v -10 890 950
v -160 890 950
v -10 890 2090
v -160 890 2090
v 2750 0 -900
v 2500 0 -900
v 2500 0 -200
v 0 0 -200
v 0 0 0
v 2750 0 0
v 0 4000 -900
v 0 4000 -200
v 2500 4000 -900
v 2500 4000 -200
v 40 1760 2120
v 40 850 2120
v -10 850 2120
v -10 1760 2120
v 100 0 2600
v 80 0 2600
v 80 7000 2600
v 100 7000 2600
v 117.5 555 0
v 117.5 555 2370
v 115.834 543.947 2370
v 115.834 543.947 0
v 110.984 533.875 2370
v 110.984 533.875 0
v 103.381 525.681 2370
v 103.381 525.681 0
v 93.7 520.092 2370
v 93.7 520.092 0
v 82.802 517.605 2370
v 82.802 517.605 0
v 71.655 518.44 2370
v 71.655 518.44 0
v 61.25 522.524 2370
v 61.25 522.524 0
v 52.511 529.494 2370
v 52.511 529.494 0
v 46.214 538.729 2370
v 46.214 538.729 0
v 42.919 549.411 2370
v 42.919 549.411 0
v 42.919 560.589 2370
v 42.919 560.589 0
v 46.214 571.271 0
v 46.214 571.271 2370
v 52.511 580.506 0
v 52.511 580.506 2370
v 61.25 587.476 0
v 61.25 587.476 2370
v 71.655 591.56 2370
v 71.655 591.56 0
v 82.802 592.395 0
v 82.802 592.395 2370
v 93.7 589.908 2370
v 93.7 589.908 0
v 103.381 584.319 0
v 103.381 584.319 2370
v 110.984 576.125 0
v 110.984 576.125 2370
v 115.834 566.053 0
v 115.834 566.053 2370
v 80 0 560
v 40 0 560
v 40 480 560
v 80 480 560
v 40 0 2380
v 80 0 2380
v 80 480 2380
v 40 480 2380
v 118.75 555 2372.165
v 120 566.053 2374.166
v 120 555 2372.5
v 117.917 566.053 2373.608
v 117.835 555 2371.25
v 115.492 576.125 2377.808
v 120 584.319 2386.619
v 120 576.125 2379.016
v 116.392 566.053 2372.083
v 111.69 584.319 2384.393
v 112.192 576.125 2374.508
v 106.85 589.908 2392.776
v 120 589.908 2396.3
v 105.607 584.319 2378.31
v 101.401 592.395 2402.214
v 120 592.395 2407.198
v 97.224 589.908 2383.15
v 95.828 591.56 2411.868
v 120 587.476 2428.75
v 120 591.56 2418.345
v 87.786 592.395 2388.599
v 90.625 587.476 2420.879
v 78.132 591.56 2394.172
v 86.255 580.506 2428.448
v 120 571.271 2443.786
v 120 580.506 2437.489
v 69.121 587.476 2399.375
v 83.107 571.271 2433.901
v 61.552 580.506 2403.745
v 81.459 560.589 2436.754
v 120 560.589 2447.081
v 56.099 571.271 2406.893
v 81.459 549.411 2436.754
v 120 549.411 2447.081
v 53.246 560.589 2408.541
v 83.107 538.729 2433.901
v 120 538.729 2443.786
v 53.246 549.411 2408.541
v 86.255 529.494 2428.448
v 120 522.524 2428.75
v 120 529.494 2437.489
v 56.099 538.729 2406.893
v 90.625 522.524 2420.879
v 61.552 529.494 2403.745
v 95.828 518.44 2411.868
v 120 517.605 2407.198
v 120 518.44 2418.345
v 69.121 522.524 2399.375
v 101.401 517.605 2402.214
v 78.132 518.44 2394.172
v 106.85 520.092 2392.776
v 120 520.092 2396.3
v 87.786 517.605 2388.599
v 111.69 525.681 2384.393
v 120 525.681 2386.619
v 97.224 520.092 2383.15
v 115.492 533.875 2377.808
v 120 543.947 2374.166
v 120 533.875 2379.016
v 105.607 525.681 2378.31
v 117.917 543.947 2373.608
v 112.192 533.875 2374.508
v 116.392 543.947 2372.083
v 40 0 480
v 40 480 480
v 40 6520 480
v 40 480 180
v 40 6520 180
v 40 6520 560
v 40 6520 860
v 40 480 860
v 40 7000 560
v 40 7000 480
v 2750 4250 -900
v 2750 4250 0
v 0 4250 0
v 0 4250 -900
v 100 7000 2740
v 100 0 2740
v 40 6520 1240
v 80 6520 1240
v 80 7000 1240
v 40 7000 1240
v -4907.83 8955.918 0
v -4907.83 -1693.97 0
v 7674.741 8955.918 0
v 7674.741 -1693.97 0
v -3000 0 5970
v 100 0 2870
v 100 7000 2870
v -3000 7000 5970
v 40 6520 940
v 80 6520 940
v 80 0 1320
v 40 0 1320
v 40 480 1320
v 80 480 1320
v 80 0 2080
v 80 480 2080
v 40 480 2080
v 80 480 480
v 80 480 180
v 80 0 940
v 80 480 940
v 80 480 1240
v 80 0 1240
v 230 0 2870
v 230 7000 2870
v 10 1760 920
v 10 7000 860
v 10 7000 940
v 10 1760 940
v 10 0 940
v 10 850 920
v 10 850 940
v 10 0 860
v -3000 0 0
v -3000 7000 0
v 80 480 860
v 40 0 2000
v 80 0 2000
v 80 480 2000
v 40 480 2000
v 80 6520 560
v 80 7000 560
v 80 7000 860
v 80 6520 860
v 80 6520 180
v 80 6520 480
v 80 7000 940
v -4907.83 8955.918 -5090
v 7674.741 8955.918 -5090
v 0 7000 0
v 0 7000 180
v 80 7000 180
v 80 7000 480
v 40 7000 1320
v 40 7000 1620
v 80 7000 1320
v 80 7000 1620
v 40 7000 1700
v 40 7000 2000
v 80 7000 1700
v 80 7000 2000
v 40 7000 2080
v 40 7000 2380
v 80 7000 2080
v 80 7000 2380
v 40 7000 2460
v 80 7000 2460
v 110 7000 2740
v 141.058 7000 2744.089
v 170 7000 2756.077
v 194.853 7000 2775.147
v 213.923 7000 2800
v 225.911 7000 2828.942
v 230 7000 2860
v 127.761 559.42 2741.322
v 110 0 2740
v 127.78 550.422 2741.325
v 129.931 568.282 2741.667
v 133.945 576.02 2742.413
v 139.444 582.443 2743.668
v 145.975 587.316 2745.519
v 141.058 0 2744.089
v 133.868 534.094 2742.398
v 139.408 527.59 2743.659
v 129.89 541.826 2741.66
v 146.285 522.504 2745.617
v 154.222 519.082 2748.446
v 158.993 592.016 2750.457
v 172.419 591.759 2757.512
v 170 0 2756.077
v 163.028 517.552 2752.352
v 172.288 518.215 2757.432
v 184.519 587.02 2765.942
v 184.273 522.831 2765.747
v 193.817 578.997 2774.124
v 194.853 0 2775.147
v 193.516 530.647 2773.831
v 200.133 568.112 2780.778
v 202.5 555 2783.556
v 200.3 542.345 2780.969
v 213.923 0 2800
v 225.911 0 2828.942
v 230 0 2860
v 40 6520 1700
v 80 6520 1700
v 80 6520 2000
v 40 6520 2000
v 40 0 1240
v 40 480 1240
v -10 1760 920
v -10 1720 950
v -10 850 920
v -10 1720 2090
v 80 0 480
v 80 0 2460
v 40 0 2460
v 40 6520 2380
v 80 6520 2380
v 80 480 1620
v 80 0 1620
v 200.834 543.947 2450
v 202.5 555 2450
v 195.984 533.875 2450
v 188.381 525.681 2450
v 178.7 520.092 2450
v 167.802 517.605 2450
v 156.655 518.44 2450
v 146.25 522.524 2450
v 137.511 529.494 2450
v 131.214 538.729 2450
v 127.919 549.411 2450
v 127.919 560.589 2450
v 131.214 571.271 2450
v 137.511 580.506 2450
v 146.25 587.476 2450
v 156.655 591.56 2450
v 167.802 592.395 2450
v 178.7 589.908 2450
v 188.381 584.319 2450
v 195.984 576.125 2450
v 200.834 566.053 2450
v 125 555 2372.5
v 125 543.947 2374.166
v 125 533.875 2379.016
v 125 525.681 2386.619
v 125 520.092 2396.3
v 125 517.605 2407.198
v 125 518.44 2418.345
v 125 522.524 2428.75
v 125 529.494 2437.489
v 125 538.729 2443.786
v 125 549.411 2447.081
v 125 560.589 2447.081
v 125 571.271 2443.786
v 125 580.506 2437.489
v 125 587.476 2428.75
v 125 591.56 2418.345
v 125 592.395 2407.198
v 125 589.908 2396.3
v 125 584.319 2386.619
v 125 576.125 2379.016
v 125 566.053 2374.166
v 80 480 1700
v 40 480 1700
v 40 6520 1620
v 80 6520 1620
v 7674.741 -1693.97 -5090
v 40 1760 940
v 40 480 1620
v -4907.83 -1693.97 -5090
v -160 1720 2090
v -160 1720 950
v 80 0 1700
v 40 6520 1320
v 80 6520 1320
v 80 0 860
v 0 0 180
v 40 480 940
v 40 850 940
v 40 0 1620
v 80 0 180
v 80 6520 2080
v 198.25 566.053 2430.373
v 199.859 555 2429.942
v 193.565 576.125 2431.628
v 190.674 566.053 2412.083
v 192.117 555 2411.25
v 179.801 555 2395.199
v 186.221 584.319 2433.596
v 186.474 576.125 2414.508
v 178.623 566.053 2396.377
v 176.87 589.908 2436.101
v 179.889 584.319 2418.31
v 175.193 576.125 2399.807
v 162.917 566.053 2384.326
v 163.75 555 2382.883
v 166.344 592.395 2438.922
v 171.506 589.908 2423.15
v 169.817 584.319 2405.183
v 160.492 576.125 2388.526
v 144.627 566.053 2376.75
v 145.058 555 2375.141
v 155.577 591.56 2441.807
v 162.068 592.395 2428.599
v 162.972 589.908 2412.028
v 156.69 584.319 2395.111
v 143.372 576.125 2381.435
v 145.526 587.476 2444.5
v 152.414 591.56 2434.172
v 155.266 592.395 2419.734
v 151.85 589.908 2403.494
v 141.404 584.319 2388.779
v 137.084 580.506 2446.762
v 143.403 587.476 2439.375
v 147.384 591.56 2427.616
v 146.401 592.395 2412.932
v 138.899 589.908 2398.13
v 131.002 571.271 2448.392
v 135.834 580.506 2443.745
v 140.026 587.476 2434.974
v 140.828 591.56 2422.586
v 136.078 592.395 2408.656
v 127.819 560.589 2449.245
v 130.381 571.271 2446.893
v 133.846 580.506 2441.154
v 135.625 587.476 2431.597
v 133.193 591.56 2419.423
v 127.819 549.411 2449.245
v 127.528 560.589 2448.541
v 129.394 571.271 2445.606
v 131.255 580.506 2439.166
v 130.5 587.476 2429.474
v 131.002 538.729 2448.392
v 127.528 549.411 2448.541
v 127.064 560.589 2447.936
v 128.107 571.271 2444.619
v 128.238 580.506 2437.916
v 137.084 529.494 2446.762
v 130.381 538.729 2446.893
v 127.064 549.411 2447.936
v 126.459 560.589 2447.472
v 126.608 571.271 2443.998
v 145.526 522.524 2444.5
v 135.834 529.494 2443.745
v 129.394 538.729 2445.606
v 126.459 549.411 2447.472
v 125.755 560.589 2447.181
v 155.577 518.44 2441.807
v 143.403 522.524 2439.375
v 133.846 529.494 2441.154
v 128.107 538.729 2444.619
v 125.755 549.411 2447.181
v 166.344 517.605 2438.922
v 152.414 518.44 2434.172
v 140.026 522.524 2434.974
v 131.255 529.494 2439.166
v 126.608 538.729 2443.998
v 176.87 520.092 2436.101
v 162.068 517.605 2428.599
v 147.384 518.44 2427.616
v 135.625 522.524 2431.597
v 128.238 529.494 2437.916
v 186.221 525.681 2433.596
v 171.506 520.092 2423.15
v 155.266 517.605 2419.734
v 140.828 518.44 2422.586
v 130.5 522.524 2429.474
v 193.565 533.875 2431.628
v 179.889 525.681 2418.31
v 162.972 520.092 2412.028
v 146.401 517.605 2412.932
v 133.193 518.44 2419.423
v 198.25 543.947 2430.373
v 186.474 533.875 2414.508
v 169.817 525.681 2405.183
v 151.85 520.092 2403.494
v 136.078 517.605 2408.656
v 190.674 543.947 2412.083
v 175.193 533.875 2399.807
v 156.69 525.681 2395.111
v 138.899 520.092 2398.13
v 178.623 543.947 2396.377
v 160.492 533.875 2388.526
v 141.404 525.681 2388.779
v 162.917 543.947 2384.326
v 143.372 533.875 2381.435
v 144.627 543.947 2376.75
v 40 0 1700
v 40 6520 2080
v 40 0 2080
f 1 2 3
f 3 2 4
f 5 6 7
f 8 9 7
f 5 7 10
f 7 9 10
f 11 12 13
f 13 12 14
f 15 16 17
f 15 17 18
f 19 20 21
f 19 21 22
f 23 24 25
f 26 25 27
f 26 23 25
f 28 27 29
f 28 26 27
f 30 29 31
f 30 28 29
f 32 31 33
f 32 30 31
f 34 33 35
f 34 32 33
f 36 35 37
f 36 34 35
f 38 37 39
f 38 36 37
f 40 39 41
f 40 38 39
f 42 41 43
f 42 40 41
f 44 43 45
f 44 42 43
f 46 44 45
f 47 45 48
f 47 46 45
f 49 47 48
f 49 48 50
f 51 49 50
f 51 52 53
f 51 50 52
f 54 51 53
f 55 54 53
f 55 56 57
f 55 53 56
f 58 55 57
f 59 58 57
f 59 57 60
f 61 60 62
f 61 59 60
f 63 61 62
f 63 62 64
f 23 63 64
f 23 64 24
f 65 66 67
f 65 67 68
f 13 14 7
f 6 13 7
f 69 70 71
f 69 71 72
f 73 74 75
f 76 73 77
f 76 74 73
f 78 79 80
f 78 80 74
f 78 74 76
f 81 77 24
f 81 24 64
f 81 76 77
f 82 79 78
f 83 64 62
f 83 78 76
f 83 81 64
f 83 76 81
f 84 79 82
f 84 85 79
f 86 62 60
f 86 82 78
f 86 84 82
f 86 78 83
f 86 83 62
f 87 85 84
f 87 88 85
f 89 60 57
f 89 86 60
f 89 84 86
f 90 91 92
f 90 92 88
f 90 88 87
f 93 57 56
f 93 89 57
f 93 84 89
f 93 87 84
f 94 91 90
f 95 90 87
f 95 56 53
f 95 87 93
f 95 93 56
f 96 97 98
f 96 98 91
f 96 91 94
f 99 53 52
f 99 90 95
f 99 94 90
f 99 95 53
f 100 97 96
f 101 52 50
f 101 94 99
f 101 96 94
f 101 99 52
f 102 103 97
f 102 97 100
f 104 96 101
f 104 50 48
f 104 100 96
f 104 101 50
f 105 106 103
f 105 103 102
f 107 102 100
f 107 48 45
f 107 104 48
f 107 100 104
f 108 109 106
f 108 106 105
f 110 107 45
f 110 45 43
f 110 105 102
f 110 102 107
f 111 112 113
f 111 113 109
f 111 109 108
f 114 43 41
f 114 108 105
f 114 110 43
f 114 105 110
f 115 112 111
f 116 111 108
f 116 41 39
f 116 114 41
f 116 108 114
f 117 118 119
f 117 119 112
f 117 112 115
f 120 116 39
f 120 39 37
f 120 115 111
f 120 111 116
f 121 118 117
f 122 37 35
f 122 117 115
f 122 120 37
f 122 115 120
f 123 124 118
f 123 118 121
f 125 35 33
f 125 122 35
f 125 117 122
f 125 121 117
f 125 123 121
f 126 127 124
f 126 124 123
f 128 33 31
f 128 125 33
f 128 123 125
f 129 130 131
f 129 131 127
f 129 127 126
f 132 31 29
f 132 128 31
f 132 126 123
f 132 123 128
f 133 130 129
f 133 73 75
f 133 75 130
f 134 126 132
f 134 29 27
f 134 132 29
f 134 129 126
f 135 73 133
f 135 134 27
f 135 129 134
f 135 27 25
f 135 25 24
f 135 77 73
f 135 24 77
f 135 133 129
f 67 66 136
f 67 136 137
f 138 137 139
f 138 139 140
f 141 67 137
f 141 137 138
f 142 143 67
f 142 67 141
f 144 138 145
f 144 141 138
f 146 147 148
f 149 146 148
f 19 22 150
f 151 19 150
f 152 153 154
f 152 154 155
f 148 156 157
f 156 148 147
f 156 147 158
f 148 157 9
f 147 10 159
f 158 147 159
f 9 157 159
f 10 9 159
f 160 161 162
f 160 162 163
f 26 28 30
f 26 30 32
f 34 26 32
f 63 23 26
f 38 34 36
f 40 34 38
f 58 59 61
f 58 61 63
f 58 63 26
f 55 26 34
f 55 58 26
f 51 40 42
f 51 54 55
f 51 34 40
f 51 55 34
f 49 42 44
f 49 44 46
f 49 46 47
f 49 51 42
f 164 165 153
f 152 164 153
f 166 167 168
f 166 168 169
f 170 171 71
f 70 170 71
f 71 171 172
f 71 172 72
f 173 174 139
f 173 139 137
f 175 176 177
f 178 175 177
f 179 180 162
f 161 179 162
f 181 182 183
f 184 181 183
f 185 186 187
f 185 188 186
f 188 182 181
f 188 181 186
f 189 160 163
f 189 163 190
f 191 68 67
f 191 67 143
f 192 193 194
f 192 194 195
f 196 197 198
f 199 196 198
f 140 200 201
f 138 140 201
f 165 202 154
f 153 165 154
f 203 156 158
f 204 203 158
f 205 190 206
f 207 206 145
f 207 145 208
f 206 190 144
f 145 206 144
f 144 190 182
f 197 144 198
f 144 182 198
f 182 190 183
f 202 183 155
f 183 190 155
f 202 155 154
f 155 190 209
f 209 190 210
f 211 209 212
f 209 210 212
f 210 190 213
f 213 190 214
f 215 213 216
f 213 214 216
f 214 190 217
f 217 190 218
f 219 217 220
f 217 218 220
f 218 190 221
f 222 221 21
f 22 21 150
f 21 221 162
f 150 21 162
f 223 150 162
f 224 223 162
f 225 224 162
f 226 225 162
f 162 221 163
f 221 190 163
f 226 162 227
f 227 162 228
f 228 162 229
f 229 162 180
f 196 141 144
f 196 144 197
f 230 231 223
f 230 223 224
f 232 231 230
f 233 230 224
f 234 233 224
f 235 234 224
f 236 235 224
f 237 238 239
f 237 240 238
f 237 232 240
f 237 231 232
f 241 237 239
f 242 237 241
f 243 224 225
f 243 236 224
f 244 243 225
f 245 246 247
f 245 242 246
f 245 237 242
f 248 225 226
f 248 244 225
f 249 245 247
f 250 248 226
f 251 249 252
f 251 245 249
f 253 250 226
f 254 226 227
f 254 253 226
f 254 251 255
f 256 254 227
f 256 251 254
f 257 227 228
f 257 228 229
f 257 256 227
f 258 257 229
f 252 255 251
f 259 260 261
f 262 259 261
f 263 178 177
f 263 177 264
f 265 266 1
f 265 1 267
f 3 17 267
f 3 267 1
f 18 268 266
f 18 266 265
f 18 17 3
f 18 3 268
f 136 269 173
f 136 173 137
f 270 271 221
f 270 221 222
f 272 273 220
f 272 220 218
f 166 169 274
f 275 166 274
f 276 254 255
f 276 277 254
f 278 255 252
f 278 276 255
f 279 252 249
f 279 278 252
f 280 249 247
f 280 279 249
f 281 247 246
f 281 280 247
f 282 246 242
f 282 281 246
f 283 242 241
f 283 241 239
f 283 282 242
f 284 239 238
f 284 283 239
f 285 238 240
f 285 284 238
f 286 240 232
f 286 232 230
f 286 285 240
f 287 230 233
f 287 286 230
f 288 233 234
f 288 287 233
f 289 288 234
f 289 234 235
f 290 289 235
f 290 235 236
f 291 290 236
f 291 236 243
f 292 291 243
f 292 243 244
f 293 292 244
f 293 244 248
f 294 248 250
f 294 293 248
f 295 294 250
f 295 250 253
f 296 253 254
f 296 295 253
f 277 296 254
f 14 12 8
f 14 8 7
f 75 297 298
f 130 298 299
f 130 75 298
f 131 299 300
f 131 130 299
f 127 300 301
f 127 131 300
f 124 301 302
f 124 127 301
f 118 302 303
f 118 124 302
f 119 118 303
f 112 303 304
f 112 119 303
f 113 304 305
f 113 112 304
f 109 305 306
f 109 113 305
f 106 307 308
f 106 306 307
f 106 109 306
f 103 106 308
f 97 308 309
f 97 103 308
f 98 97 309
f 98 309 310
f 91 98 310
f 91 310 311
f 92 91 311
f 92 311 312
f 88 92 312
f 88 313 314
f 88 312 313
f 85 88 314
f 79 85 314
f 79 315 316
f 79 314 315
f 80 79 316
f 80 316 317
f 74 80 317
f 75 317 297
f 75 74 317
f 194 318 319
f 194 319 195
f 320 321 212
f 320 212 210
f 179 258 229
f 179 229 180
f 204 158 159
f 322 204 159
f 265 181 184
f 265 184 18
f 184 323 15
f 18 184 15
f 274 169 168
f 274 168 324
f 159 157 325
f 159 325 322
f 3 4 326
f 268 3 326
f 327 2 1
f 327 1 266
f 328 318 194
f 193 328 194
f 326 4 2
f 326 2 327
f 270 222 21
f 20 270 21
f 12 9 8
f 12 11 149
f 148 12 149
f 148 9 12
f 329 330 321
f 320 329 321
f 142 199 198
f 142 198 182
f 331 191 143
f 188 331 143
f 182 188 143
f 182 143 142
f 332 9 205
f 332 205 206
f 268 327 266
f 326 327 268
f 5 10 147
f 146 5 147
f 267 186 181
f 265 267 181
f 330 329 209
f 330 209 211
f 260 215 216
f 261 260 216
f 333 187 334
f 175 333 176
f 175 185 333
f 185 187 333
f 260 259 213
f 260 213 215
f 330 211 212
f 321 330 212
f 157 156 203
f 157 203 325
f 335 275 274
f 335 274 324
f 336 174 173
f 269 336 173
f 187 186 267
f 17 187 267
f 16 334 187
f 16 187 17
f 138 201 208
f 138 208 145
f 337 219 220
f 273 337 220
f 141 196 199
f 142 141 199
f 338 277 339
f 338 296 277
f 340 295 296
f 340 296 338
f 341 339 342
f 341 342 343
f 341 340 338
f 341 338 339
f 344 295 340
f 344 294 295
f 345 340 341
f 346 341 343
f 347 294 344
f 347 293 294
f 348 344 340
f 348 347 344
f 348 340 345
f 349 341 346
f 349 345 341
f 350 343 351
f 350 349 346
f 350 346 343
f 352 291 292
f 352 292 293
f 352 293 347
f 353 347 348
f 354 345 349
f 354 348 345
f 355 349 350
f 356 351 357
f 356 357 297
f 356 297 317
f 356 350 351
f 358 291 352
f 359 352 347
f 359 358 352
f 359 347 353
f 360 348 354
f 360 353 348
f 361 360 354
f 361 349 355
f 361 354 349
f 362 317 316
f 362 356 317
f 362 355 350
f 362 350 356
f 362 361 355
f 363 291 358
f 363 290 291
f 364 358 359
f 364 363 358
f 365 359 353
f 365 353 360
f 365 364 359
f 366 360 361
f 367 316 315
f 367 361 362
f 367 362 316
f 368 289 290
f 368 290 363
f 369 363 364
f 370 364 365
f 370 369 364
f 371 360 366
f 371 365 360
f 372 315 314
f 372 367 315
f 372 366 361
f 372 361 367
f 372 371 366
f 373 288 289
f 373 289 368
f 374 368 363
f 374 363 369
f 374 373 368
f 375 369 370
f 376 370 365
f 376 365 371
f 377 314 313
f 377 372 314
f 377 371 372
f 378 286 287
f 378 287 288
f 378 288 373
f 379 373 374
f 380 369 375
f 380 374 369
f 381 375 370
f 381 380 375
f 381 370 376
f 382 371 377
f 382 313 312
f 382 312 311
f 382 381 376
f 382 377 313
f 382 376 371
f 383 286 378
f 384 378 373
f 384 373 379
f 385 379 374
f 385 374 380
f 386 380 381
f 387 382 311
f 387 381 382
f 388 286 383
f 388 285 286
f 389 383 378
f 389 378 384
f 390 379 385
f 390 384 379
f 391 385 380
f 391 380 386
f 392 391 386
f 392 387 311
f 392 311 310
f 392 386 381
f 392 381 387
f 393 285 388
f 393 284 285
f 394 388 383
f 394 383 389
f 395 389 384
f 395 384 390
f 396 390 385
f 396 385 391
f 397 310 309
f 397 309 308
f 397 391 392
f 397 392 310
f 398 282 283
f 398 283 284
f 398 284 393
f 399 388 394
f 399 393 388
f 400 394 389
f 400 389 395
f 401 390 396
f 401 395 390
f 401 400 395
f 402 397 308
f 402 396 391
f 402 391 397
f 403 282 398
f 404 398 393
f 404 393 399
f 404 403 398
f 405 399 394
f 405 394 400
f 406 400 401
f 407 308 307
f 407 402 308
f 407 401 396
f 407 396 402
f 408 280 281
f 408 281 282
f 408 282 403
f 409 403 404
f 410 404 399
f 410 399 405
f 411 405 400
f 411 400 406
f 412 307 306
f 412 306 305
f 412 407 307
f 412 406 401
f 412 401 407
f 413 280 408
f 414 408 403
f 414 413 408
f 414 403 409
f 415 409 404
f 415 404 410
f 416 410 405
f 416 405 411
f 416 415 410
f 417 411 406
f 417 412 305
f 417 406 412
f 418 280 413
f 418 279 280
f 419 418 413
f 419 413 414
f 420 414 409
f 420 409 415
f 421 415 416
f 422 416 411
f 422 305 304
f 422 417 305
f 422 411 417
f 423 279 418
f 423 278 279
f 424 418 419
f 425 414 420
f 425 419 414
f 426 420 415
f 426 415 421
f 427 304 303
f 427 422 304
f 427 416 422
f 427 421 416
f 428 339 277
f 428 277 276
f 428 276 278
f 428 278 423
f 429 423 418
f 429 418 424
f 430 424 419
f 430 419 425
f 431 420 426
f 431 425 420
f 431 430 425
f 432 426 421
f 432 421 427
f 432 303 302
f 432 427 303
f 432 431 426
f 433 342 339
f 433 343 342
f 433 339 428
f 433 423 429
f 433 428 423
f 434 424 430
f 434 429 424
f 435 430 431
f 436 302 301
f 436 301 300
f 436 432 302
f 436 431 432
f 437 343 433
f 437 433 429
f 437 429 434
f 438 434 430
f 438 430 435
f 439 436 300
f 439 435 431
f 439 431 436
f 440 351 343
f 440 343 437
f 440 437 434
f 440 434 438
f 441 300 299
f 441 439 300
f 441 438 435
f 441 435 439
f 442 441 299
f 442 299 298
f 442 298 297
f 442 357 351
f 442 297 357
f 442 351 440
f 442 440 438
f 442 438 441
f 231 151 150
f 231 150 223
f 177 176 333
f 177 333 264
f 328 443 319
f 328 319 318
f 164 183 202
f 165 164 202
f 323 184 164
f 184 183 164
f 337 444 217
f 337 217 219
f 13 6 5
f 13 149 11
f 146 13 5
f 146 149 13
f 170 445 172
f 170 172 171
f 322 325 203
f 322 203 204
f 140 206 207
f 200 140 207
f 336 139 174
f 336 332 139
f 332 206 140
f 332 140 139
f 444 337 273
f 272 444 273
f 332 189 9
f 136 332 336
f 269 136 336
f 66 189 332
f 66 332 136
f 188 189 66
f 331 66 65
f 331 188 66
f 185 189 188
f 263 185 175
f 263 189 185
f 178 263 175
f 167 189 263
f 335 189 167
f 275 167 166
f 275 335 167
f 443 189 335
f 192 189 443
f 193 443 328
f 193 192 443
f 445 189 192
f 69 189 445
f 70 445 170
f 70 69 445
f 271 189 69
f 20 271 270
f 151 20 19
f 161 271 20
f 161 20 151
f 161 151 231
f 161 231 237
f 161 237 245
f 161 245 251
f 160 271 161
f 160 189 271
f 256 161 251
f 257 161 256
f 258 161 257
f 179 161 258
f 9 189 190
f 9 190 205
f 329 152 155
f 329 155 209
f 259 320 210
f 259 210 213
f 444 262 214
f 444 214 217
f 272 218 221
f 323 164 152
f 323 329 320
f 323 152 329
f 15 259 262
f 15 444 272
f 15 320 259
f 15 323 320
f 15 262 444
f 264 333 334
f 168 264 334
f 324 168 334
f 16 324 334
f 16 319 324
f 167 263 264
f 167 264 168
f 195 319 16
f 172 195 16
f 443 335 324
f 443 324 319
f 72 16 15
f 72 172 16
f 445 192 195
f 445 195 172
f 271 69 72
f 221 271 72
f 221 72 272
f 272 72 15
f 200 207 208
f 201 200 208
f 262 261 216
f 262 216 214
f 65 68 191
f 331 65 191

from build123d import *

# Parameters (mm, degrees)
F1_DEPTH  = 7000
F2_W      = 6040
F2_H      = 2460
F3_DEPTH  = 40
F6_R      = 37.5
F8_W      = 910
F8_H      = 1200
F9_DEPTH  = 200
F10_W     = 910
F10_H     = 1200
F10_W_2   = 830
F10_H_2   = 1140
F11_DEPTH = 150
F12_W     = 12582.5710296631
F12_H     = 10649.8882770538
F12_W_2   = 3000
F12_H_2   = 7000
F13_DEPTH = 5090
F14_W     = 2500
F14_H     = 4000
F15_DEPTH = 200
F14_H_2   = 250
F16_DEPTH = 900


# Not quite as in the source:
# - a feature names something its author has since deleted; it is built from what else it names


with BuildPart() as f1:
    # F0 (on Front) → F1 (new body)
    with BuildSketch(Plane.XZ):
        with BuildLine():
            Line((0, 180), (80, 180))
            Line((80, 180), (80, 480))
            Line((80, 480), (40, 480))
            Line((40, 480), (40, 560))
            Line((40, 560), (80, 560))
            Line((80, 560), (80, 860))
            Line((80, 860), (10, 860))
            Line((10, 860), (10, 940))
            Line((10, 940), (80, 940))
            Line((80, 940), (80, 1240))
            Line((80, 1240), (40, 1240))
            Line((40, 1240), (40, 1320))
            Line((40, 1320), (80, 1320))
            Line((80, 1320), (80, 1620))
            Line((80, 1620), (40, 1620))
            Line((40, 1620), (40, 1700))
            Line((40, 1700), (80, 1700))
            Line((80, 1700), (80, 2000))
            Line((80, 2000), (40, 2000))
            Line((40, 2000), (40, 2080))
            Line((40, 2080), (80, 2080))
            Line((80, 2080), (80, 2380))
            Line((80, 2380), (40, 2380))
            Line((40, 2380), (40, 2460))
            Line((40, 2460), (80, 2460))
            Line((80, 2460), (80, 2600))
            Line((80, 2600), (100, 2600))
            Line((100, 2600), (100, 2740))
            Line((100, 2740), (110, 2740))
            ThreePointArc((110, 2740), (194.8528137424, 2775.1471862576), (230, 2860))
            Line((230, 2860), (230, 2870))
            Line((230, 2870), (100, 2870))
            Line((100, 2870), (-3000, 5970))
            Line((-3000, 5970), (-3000, 0))
            Line((-3000, 0), (0, 0))
            Line((0, 0), (0, 180))
        make_face()
    extrude(amount=-F1_DEPTH)

    # F2 (on face) → F3 (cut, through all)
    with BuildSketch(Plane.YZ.offset(80)):
        with Locations((3500, 1230)):
            Rectangle(F2_W, F2_H)
    extrude(amount=-F3_DEPTH, mode=Mode.SUBTRACT)

    # F7: sweep along a path in F5
    with BuildLine(Plane(origin=(0, 555, 0), x_dir=(-1, 0, 0), z_dir=(0, 1, 0))) as f7_path:
        Line((-165, 2870), (-165, 2450))
        ThreePointArc((-165, 2450), (-153.2842712475, 2421.7157287525), (-125, 2410))
        Line((-125, 2410), (-120, 2410))
        ThreePointArc((-120, 2410), (-91.7157287525, 2398.2842712475), (-80, 2370))
        Line((-80, 2370), (-80, 0))
    # F6 (on face) → F7 (sweep)
    with BuildSketch(Plane(origin=(0, 0, 0), x_dir=(1, 0, 0), z_dir=(0, 0, -1))):
        with Locations((80, -555)):
            Circle(F6_R)
    sweep(path=f7_path.line)

    # F8 (on face) → F9 (cut)
    with BuildSketch(Plane.YZ.offset(40)):
        with Locations((1305, 1520)):
            Rectangle(F8_W, F8_H)
    extrude(amount=-F9_DEPTH, mode=Mode.SUBTRACT)

    # F10 (on face) → F11 (join)
    with BuildSketch(Plane.YZ.offset(-160)):
        with Locations((1305, 1520)):
            Rectangle(F10_W, F10_H)
        with Locations((1305, 1520)):
            Rectangle(F10_W_2, F10_H_2, mode=Mode.SUBTRACT)
    extrude(amount=F11_DEPTH)


with BuildPart() as f13:
    # F12 (on face) → F13 (new body)
    with BuildSketch(Plane(origin=(0, 0, 0), x_dir=(1, 0, 0), z_dir=(0, 0, -1))):
        with Locations((1383.4552764893, -3630.9741735458)):
            Rectangle(F12_W, F12_H)
        with Locations((-1500, -3500)):
            Rectangle(F12_W_2, F12_H_2, mode=Mode.SUBTRACT)
        with Locations((-1500, -3500)):
            Rectangle(F12_W_2, F12_H_2)
    extrude(amount=F13_DEPTH)

    # F14 (on face) → F15 (cut)
    with BuildSketch(Plane.XY):
        with Locations((1250, 2000)):
            Rectangle(F14_W, F14_H)
    extrude(amount=-F15_DEPTH, mode=Mode.SUBTRACT)

    # F14 (on face) → F16 (cut)
    with BuildSketch(Plane.XY):
        Polygon((2500, 4000), (2500, 0), (2750, 0), (2750, 4250), (2500, 4250), align=None)
        with Locations((1250, 4125)):
            Rectangle(F14_W, F14_H_2)
    extrude(amount=-F16_DEPTH, mode=Mode.SUBTRACT)


solid = Compound([f1.part, f13.part])
